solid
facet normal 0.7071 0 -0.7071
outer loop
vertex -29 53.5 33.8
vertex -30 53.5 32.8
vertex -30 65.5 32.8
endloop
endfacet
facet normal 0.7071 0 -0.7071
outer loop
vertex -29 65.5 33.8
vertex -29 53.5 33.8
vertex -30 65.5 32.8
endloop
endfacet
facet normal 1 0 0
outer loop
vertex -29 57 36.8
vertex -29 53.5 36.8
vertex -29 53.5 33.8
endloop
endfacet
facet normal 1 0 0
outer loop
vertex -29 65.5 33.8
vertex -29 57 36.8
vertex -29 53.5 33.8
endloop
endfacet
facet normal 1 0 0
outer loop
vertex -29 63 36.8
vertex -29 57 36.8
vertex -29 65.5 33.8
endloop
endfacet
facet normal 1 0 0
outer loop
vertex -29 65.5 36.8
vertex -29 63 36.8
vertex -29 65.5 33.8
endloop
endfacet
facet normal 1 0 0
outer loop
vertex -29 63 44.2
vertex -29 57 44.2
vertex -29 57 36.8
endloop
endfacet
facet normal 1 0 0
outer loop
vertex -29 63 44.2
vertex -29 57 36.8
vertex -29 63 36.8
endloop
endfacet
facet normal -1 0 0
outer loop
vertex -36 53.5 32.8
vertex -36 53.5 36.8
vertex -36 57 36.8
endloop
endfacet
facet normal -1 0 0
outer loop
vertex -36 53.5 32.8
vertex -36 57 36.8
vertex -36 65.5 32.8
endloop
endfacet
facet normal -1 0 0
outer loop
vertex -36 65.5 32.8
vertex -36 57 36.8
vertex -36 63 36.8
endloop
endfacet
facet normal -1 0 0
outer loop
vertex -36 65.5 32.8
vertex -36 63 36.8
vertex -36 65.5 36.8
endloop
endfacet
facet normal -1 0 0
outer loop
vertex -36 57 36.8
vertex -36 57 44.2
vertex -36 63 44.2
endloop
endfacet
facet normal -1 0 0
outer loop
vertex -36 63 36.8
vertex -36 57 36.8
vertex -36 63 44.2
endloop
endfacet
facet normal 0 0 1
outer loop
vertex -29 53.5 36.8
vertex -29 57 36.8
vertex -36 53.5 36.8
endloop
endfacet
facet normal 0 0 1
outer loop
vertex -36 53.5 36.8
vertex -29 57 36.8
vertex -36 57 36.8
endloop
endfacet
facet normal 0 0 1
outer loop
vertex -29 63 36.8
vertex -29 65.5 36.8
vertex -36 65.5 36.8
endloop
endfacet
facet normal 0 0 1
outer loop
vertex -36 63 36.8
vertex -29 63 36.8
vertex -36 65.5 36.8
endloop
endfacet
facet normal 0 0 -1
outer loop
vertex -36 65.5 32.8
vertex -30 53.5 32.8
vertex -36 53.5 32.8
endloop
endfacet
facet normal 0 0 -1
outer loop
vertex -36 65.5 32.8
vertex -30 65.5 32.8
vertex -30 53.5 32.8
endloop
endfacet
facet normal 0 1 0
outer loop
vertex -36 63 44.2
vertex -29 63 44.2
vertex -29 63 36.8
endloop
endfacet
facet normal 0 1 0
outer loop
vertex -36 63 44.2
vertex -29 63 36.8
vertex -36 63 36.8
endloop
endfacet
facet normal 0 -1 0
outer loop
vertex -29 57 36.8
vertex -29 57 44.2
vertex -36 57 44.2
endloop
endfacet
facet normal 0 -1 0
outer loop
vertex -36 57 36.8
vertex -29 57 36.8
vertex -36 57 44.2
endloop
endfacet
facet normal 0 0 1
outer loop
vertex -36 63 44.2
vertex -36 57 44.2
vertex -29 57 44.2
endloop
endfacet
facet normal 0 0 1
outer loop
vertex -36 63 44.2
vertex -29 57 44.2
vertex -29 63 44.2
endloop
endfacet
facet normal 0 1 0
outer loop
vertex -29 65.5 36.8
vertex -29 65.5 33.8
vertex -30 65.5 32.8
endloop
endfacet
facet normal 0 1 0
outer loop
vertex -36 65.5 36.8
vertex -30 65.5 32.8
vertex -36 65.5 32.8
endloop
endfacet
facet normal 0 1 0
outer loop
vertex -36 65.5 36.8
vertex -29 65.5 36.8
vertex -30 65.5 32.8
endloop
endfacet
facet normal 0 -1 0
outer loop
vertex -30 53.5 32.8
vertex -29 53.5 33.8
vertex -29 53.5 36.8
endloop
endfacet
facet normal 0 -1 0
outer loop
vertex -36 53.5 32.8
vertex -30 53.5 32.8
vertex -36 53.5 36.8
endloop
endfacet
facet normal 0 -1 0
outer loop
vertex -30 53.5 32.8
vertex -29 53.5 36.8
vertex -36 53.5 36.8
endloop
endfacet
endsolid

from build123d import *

# Parameters (mm, degrees)
BOX046_W                     = 6
BOX046_H                     = 7
BOX046_DEPTH                 = 7.4
BOX045_W                     = 7
BOX045_H                     = 12
BOX045_DEPTH                 = 4
CHAMFER_SIZE                 = 1
CHAMFER_PLACEMENT_ANGLE      = 90
FUSION002026_PLACEMENT_ANGLE = 90


with BuildPart() as cubo046:
    # Box046 → Box046 (new body)
    with BuildSketch(Plane(origin=(-13, -15, 2.5), x_dir=(1, 0, 0), z_dir=(0, 0, 1))):
        with Locations((3, 3.5)):
            Rectangle(BOX046_W, BOX046_H)
    extrude(amount=BOX046_DEPTH)


with BuildPart() as fusion002026:
    # Box045 → Box045 (new body)
    with BuildSketch(Plane(origin=(-13, -7, 2), x_dir=(1, 0, 0), z_dir=(0, 0, -1))):
        with Locations((3.5, 6)):
            Rectangle(BOX045_W, BOX045_H)
    extrude(amount=BOX045_DEPTH)

    # Chamfer
    chamfer_edges = [fusion002026.edges().sort_by_distance(p)[0] for p in [
        (-13, -13, -2),
    ]]
    chamfer(chamfer_edges, length=CHAMFER_SIZE)


with BuildPart() as fusion002026_1:
    # Chamfer placement: moved
    add(fusion002026.part.moved(Location((-23.5, -2, 0.5))).rotate(Axis((-23.5, -2, 0.5), (0, 0, 1)), CHAMFER_PLACEMENT_ANGLE))

    # Fusion002026: union Cubo046
    add(cubo046.part)


with BuildPart() as fusion002026_2:
    # Fusion002026 placement: moved
    add(fusion002026_1.part.moved(Location((-44, 70, 34.3))).rotate(Axis((-44, 70, 34.3), (0, 0, 1)), FUSION002026_PLACEMENT_ANGLE))


solid = fusion002026_2.part
